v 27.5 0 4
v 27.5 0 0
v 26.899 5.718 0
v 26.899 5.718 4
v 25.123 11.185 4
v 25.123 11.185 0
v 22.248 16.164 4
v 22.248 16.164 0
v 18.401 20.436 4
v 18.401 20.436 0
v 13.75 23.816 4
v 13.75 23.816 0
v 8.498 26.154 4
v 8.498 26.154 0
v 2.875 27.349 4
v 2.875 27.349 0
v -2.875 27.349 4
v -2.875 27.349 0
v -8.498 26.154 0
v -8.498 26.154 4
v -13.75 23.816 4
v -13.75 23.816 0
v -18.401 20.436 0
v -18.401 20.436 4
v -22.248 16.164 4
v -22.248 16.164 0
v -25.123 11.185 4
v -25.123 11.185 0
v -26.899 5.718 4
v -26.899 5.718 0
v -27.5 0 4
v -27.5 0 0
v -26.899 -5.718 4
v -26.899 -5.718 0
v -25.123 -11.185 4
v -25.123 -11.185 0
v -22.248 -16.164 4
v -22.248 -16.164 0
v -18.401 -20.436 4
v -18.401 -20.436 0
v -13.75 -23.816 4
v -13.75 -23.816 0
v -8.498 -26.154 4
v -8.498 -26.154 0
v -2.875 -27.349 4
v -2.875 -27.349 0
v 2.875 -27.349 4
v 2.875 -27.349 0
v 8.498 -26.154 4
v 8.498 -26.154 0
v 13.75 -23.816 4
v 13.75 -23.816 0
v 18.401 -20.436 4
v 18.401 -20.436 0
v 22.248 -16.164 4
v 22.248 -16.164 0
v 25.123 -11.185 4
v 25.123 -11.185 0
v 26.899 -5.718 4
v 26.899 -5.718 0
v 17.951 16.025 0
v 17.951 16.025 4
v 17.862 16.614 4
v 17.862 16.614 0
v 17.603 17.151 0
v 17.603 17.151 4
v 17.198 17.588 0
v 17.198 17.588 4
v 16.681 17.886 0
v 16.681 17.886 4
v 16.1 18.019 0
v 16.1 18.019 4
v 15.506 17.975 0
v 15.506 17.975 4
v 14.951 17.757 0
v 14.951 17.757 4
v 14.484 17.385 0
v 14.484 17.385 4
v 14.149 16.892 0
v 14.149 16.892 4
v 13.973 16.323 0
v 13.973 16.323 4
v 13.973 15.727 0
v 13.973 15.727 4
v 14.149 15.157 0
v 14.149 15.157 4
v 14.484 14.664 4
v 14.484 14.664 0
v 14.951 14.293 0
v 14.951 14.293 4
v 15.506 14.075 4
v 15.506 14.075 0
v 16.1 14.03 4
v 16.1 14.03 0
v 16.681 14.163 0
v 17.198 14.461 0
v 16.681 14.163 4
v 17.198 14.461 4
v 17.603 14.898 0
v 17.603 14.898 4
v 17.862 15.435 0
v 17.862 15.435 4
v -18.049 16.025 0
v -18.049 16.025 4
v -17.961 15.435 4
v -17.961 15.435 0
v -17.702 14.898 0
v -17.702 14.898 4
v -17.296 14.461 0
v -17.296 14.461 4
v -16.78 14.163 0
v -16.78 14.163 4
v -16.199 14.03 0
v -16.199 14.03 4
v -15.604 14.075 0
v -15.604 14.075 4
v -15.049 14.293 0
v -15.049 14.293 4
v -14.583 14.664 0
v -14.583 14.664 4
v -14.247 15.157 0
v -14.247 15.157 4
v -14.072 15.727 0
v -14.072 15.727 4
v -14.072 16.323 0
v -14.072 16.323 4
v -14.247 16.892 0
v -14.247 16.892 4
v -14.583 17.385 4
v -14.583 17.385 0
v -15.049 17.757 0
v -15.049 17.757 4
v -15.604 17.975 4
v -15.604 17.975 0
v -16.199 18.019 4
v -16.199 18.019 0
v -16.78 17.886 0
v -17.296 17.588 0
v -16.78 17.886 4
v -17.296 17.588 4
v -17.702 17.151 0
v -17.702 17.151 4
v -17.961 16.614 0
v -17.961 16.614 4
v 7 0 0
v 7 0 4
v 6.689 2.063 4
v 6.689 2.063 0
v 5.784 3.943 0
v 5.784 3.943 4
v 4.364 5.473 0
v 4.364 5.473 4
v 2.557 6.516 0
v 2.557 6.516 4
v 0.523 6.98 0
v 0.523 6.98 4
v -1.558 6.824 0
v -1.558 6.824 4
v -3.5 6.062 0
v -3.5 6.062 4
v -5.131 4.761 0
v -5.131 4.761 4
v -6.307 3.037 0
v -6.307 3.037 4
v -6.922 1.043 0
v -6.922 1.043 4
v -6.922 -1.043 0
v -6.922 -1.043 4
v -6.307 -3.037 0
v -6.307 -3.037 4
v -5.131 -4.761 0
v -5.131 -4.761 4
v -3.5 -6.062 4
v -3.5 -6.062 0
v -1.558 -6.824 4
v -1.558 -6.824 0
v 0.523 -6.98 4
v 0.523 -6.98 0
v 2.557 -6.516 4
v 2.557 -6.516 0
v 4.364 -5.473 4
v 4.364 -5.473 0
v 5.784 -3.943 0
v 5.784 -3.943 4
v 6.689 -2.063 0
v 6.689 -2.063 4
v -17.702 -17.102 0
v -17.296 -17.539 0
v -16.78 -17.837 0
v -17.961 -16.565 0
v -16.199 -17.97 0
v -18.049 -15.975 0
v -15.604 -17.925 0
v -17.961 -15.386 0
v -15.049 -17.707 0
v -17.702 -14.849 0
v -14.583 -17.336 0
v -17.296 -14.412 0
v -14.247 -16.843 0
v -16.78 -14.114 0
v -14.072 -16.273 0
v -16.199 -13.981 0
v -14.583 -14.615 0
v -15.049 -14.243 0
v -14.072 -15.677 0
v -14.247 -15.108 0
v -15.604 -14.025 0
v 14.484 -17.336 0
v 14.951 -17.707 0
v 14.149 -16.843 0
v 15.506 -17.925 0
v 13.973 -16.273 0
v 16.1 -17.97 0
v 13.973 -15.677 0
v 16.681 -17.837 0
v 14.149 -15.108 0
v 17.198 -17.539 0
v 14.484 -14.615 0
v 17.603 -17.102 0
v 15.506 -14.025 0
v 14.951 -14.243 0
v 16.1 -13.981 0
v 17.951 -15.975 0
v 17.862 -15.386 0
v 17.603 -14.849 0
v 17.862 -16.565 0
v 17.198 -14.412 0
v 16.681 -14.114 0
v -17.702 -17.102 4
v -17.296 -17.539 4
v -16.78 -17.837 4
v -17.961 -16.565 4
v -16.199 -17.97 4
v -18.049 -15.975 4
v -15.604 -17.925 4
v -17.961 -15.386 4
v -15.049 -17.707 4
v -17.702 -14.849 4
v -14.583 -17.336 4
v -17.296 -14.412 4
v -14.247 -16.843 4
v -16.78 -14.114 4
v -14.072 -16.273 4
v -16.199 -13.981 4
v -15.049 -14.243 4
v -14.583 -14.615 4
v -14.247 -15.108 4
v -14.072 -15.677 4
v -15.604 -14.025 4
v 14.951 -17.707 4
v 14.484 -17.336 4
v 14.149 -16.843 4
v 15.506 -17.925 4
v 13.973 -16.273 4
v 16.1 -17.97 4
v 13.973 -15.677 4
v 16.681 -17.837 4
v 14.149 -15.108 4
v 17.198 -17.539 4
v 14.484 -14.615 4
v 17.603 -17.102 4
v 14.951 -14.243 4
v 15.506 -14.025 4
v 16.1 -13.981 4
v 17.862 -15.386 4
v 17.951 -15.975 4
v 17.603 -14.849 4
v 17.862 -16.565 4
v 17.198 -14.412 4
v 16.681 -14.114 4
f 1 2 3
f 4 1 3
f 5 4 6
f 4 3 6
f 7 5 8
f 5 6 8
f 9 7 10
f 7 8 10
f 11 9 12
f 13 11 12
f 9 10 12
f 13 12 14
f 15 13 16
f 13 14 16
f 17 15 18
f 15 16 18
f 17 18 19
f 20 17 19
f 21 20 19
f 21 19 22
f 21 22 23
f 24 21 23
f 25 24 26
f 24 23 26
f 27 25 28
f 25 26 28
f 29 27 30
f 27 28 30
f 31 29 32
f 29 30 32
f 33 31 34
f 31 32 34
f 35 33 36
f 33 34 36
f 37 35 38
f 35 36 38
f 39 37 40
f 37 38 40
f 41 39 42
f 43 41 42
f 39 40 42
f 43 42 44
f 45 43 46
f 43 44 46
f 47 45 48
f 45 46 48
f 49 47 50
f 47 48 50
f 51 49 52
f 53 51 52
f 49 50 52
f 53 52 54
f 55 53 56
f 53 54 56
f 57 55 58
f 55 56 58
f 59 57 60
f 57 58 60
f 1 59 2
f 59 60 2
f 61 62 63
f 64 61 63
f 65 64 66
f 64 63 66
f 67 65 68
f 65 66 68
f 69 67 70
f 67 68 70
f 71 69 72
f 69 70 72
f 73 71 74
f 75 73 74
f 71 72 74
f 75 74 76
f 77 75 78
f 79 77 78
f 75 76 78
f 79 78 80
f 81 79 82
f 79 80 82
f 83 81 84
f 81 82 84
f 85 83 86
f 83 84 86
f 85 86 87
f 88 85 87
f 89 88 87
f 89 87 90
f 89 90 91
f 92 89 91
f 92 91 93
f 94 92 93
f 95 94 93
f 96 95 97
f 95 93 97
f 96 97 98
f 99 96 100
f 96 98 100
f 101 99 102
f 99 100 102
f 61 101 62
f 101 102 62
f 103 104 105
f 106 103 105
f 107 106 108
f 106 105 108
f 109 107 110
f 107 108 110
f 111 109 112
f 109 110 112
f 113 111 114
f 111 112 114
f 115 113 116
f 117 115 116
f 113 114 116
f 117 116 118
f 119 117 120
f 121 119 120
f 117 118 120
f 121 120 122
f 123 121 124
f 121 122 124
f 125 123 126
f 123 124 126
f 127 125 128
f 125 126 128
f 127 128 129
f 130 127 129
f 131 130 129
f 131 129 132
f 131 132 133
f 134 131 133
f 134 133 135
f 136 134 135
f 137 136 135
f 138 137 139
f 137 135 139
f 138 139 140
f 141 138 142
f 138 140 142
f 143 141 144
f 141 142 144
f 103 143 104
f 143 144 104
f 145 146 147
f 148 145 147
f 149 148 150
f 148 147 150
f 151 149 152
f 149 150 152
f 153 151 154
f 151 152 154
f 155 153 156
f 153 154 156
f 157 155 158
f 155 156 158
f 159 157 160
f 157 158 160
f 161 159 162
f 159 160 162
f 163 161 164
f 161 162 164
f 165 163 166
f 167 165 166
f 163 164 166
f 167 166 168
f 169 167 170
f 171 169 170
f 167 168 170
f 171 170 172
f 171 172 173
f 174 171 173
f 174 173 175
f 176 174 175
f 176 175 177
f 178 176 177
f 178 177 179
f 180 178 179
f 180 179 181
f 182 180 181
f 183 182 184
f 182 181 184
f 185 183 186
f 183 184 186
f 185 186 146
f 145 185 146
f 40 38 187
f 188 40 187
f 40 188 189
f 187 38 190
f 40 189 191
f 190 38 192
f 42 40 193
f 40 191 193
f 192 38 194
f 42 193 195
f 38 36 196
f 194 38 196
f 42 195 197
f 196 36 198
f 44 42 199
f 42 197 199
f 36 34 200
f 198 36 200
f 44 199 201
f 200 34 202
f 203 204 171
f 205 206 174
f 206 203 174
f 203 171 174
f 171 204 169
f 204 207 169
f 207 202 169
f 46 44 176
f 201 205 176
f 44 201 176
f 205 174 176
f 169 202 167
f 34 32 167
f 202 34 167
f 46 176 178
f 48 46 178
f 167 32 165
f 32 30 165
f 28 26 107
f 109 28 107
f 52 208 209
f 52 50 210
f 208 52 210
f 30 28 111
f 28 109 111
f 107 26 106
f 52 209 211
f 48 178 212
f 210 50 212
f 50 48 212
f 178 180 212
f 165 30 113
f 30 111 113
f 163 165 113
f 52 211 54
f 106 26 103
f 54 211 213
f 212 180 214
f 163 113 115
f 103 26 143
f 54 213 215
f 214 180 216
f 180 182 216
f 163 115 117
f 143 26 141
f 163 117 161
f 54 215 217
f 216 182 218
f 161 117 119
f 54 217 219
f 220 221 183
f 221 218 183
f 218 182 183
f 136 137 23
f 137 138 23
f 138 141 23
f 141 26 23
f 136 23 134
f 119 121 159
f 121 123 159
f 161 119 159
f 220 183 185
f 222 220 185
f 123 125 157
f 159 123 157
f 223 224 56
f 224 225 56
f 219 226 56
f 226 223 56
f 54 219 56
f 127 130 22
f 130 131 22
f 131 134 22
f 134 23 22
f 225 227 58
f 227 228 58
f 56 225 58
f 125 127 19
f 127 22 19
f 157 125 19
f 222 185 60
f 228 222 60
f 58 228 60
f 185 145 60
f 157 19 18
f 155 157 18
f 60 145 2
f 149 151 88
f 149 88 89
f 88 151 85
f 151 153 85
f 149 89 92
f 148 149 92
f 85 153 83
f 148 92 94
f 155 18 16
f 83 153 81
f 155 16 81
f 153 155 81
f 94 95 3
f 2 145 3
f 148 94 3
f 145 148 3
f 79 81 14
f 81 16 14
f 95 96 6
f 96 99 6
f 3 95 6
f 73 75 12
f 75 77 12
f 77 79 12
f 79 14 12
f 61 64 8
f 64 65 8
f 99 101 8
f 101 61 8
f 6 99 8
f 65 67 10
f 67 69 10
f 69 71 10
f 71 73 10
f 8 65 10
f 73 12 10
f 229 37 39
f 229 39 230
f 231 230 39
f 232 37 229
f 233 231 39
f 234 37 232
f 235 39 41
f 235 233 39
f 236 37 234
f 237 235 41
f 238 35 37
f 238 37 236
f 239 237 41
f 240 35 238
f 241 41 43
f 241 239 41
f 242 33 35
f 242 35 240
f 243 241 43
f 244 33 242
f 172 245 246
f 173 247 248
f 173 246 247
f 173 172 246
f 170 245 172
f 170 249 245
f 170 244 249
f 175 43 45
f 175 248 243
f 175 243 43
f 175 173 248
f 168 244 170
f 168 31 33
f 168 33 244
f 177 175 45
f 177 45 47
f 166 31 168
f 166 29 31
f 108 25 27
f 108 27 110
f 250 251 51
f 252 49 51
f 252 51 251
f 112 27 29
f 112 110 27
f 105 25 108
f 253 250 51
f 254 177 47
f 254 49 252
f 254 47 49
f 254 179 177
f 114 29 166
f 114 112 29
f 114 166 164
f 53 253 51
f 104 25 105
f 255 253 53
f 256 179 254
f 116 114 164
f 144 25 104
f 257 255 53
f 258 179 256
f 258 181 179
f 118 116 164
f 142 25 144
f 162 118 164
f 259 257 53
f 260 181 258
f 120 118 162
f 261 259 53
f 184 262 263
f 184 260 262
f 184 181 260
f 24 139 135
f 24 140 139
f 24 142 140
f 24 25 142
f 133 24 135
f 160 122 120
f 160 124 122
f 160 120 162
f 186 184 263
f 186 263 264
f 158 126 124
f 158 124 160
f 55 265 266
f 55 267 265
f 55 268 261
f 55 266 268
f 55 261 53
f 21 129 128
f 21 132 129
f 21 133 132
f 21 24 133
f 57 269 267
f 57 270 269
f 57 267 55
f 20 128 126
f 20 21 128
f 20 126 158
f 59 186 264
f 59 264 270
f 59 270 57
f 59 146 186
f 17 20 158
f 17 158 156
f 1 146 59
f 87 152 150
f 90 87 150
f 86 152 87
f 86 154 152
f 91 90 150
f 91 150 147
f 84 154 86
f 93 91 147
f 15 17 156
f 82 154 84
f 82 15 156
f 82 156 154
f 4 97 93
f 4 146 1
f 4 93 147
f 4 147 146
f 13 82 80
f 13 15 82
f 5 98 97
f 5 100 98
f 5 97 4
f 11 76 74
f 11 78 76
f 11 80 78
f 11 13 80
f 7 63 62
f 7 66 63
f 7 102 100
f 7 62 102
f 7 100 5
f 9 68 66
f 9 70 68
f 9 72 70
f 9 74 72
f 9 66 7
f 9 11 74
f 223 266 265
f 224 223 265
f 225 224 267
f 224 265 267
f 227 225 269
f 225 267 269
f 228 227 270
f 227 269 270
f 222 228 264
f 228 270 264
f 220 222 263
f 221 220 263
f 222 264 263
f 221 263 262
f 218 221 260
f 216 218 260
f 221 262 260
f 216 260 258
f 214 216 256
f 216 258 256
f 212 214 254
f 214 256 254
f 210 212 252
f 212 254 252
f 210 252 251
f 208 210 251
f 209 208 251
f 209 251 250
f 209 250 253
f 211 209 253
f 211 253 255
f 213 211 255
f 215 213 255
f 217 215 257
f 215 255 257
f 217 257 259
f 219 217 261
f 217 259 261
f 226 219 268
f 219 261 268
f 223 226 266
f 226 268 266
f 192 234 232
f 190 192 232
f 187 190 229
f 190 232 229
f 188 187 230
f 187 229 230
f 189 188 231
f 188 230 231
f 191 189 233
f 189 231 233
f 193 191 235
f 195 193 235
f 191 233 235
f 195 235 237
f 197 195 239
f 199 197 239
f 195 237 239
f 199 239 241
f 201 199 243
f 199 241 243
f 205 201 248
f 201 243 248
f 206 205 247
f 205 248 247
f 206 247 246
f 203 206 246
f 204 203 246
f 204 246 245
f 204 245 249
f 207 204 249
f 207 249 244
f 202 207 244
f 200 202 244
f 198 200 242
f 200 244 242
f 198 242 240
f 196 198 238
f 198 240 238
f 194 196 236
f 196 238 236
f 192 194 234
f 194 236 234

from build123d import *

# Parameters (mm, degrees)
SKETCH1_R           = 27.5
BOSS_EXTRUDE1_DEPTH = 4
CUT_EXTRUDE1_DEPTH  = 4
SKETCH3_R           = 7
CUT_EXTRUDE2_DEPTH  = 4


with BuildPart() as part:
    # Sketch1 → Boss-Extrude1 (new body)
    with BuildSketch(Plane.XY):
        Circle(SKETCH1_R)
    extrude(amount=BOSS_EXTRUDE1_DEPTH)

    # Sketch2 → Cut-Extrude1 (cut)
    with BuildSketch(Plane.XY.offset(4)):
        with BuildLine():
            ThreePointArc((-14.049415004, 16.024707502), (-16.049415004, 18.024707502), (-18.049415004, 16.024707502))
            ThreePointArc((-18.049415004, 16.024707502), (-16.049415004, 14.024707502), (-14.049415004, 16.024707502))
        make_face()
        with BuildLine():
            ThreePointArc((-14.049415004, -15.975292498), (-16.049415004, -13.975292498), (-18.049415004, -15.975292498))
            ThreePointArc((-18.049415004, -15.975292498), (-16.049415004, -17.975292498), (-14.049415004, -15.975292498))
        make_face()
        with BuildLine():
            ThreePointArc((13.950584996, -15.975292498), (15.950584996, -17.975292498), (17.950584996, -15.975292498))
            ThreePointArc((17.950584996, -15.975292498), (15.950584996, -13.975292498), (13.950584996, -15.975292498))
        make_face()
        with BuildLine():
            ThreePointArc((13.950584996, 16.024707502), (15.950584996, 14.024707502), (17.950584996, 16.024707502))
            ThreePointArc((17.950584996, 16.024707502), (15.950584996, 18.024707502), (13.950584996, 16.024707502))
        make_face()
    extrude(amount=-CUT_EXTRUDE1_DEPTH, mode=Mode.SUBTRACT)

    # Sketch3 → Cut-Extrude2 (cut)
    with BuildSketch(Plane.XY.offset(4)):
        Circle(SKETCH3_R)
    extrude(amount=-CUT_EXTRUDE2_DEPTH, mode=Mode.SUBTRACT)


solid = part.part
